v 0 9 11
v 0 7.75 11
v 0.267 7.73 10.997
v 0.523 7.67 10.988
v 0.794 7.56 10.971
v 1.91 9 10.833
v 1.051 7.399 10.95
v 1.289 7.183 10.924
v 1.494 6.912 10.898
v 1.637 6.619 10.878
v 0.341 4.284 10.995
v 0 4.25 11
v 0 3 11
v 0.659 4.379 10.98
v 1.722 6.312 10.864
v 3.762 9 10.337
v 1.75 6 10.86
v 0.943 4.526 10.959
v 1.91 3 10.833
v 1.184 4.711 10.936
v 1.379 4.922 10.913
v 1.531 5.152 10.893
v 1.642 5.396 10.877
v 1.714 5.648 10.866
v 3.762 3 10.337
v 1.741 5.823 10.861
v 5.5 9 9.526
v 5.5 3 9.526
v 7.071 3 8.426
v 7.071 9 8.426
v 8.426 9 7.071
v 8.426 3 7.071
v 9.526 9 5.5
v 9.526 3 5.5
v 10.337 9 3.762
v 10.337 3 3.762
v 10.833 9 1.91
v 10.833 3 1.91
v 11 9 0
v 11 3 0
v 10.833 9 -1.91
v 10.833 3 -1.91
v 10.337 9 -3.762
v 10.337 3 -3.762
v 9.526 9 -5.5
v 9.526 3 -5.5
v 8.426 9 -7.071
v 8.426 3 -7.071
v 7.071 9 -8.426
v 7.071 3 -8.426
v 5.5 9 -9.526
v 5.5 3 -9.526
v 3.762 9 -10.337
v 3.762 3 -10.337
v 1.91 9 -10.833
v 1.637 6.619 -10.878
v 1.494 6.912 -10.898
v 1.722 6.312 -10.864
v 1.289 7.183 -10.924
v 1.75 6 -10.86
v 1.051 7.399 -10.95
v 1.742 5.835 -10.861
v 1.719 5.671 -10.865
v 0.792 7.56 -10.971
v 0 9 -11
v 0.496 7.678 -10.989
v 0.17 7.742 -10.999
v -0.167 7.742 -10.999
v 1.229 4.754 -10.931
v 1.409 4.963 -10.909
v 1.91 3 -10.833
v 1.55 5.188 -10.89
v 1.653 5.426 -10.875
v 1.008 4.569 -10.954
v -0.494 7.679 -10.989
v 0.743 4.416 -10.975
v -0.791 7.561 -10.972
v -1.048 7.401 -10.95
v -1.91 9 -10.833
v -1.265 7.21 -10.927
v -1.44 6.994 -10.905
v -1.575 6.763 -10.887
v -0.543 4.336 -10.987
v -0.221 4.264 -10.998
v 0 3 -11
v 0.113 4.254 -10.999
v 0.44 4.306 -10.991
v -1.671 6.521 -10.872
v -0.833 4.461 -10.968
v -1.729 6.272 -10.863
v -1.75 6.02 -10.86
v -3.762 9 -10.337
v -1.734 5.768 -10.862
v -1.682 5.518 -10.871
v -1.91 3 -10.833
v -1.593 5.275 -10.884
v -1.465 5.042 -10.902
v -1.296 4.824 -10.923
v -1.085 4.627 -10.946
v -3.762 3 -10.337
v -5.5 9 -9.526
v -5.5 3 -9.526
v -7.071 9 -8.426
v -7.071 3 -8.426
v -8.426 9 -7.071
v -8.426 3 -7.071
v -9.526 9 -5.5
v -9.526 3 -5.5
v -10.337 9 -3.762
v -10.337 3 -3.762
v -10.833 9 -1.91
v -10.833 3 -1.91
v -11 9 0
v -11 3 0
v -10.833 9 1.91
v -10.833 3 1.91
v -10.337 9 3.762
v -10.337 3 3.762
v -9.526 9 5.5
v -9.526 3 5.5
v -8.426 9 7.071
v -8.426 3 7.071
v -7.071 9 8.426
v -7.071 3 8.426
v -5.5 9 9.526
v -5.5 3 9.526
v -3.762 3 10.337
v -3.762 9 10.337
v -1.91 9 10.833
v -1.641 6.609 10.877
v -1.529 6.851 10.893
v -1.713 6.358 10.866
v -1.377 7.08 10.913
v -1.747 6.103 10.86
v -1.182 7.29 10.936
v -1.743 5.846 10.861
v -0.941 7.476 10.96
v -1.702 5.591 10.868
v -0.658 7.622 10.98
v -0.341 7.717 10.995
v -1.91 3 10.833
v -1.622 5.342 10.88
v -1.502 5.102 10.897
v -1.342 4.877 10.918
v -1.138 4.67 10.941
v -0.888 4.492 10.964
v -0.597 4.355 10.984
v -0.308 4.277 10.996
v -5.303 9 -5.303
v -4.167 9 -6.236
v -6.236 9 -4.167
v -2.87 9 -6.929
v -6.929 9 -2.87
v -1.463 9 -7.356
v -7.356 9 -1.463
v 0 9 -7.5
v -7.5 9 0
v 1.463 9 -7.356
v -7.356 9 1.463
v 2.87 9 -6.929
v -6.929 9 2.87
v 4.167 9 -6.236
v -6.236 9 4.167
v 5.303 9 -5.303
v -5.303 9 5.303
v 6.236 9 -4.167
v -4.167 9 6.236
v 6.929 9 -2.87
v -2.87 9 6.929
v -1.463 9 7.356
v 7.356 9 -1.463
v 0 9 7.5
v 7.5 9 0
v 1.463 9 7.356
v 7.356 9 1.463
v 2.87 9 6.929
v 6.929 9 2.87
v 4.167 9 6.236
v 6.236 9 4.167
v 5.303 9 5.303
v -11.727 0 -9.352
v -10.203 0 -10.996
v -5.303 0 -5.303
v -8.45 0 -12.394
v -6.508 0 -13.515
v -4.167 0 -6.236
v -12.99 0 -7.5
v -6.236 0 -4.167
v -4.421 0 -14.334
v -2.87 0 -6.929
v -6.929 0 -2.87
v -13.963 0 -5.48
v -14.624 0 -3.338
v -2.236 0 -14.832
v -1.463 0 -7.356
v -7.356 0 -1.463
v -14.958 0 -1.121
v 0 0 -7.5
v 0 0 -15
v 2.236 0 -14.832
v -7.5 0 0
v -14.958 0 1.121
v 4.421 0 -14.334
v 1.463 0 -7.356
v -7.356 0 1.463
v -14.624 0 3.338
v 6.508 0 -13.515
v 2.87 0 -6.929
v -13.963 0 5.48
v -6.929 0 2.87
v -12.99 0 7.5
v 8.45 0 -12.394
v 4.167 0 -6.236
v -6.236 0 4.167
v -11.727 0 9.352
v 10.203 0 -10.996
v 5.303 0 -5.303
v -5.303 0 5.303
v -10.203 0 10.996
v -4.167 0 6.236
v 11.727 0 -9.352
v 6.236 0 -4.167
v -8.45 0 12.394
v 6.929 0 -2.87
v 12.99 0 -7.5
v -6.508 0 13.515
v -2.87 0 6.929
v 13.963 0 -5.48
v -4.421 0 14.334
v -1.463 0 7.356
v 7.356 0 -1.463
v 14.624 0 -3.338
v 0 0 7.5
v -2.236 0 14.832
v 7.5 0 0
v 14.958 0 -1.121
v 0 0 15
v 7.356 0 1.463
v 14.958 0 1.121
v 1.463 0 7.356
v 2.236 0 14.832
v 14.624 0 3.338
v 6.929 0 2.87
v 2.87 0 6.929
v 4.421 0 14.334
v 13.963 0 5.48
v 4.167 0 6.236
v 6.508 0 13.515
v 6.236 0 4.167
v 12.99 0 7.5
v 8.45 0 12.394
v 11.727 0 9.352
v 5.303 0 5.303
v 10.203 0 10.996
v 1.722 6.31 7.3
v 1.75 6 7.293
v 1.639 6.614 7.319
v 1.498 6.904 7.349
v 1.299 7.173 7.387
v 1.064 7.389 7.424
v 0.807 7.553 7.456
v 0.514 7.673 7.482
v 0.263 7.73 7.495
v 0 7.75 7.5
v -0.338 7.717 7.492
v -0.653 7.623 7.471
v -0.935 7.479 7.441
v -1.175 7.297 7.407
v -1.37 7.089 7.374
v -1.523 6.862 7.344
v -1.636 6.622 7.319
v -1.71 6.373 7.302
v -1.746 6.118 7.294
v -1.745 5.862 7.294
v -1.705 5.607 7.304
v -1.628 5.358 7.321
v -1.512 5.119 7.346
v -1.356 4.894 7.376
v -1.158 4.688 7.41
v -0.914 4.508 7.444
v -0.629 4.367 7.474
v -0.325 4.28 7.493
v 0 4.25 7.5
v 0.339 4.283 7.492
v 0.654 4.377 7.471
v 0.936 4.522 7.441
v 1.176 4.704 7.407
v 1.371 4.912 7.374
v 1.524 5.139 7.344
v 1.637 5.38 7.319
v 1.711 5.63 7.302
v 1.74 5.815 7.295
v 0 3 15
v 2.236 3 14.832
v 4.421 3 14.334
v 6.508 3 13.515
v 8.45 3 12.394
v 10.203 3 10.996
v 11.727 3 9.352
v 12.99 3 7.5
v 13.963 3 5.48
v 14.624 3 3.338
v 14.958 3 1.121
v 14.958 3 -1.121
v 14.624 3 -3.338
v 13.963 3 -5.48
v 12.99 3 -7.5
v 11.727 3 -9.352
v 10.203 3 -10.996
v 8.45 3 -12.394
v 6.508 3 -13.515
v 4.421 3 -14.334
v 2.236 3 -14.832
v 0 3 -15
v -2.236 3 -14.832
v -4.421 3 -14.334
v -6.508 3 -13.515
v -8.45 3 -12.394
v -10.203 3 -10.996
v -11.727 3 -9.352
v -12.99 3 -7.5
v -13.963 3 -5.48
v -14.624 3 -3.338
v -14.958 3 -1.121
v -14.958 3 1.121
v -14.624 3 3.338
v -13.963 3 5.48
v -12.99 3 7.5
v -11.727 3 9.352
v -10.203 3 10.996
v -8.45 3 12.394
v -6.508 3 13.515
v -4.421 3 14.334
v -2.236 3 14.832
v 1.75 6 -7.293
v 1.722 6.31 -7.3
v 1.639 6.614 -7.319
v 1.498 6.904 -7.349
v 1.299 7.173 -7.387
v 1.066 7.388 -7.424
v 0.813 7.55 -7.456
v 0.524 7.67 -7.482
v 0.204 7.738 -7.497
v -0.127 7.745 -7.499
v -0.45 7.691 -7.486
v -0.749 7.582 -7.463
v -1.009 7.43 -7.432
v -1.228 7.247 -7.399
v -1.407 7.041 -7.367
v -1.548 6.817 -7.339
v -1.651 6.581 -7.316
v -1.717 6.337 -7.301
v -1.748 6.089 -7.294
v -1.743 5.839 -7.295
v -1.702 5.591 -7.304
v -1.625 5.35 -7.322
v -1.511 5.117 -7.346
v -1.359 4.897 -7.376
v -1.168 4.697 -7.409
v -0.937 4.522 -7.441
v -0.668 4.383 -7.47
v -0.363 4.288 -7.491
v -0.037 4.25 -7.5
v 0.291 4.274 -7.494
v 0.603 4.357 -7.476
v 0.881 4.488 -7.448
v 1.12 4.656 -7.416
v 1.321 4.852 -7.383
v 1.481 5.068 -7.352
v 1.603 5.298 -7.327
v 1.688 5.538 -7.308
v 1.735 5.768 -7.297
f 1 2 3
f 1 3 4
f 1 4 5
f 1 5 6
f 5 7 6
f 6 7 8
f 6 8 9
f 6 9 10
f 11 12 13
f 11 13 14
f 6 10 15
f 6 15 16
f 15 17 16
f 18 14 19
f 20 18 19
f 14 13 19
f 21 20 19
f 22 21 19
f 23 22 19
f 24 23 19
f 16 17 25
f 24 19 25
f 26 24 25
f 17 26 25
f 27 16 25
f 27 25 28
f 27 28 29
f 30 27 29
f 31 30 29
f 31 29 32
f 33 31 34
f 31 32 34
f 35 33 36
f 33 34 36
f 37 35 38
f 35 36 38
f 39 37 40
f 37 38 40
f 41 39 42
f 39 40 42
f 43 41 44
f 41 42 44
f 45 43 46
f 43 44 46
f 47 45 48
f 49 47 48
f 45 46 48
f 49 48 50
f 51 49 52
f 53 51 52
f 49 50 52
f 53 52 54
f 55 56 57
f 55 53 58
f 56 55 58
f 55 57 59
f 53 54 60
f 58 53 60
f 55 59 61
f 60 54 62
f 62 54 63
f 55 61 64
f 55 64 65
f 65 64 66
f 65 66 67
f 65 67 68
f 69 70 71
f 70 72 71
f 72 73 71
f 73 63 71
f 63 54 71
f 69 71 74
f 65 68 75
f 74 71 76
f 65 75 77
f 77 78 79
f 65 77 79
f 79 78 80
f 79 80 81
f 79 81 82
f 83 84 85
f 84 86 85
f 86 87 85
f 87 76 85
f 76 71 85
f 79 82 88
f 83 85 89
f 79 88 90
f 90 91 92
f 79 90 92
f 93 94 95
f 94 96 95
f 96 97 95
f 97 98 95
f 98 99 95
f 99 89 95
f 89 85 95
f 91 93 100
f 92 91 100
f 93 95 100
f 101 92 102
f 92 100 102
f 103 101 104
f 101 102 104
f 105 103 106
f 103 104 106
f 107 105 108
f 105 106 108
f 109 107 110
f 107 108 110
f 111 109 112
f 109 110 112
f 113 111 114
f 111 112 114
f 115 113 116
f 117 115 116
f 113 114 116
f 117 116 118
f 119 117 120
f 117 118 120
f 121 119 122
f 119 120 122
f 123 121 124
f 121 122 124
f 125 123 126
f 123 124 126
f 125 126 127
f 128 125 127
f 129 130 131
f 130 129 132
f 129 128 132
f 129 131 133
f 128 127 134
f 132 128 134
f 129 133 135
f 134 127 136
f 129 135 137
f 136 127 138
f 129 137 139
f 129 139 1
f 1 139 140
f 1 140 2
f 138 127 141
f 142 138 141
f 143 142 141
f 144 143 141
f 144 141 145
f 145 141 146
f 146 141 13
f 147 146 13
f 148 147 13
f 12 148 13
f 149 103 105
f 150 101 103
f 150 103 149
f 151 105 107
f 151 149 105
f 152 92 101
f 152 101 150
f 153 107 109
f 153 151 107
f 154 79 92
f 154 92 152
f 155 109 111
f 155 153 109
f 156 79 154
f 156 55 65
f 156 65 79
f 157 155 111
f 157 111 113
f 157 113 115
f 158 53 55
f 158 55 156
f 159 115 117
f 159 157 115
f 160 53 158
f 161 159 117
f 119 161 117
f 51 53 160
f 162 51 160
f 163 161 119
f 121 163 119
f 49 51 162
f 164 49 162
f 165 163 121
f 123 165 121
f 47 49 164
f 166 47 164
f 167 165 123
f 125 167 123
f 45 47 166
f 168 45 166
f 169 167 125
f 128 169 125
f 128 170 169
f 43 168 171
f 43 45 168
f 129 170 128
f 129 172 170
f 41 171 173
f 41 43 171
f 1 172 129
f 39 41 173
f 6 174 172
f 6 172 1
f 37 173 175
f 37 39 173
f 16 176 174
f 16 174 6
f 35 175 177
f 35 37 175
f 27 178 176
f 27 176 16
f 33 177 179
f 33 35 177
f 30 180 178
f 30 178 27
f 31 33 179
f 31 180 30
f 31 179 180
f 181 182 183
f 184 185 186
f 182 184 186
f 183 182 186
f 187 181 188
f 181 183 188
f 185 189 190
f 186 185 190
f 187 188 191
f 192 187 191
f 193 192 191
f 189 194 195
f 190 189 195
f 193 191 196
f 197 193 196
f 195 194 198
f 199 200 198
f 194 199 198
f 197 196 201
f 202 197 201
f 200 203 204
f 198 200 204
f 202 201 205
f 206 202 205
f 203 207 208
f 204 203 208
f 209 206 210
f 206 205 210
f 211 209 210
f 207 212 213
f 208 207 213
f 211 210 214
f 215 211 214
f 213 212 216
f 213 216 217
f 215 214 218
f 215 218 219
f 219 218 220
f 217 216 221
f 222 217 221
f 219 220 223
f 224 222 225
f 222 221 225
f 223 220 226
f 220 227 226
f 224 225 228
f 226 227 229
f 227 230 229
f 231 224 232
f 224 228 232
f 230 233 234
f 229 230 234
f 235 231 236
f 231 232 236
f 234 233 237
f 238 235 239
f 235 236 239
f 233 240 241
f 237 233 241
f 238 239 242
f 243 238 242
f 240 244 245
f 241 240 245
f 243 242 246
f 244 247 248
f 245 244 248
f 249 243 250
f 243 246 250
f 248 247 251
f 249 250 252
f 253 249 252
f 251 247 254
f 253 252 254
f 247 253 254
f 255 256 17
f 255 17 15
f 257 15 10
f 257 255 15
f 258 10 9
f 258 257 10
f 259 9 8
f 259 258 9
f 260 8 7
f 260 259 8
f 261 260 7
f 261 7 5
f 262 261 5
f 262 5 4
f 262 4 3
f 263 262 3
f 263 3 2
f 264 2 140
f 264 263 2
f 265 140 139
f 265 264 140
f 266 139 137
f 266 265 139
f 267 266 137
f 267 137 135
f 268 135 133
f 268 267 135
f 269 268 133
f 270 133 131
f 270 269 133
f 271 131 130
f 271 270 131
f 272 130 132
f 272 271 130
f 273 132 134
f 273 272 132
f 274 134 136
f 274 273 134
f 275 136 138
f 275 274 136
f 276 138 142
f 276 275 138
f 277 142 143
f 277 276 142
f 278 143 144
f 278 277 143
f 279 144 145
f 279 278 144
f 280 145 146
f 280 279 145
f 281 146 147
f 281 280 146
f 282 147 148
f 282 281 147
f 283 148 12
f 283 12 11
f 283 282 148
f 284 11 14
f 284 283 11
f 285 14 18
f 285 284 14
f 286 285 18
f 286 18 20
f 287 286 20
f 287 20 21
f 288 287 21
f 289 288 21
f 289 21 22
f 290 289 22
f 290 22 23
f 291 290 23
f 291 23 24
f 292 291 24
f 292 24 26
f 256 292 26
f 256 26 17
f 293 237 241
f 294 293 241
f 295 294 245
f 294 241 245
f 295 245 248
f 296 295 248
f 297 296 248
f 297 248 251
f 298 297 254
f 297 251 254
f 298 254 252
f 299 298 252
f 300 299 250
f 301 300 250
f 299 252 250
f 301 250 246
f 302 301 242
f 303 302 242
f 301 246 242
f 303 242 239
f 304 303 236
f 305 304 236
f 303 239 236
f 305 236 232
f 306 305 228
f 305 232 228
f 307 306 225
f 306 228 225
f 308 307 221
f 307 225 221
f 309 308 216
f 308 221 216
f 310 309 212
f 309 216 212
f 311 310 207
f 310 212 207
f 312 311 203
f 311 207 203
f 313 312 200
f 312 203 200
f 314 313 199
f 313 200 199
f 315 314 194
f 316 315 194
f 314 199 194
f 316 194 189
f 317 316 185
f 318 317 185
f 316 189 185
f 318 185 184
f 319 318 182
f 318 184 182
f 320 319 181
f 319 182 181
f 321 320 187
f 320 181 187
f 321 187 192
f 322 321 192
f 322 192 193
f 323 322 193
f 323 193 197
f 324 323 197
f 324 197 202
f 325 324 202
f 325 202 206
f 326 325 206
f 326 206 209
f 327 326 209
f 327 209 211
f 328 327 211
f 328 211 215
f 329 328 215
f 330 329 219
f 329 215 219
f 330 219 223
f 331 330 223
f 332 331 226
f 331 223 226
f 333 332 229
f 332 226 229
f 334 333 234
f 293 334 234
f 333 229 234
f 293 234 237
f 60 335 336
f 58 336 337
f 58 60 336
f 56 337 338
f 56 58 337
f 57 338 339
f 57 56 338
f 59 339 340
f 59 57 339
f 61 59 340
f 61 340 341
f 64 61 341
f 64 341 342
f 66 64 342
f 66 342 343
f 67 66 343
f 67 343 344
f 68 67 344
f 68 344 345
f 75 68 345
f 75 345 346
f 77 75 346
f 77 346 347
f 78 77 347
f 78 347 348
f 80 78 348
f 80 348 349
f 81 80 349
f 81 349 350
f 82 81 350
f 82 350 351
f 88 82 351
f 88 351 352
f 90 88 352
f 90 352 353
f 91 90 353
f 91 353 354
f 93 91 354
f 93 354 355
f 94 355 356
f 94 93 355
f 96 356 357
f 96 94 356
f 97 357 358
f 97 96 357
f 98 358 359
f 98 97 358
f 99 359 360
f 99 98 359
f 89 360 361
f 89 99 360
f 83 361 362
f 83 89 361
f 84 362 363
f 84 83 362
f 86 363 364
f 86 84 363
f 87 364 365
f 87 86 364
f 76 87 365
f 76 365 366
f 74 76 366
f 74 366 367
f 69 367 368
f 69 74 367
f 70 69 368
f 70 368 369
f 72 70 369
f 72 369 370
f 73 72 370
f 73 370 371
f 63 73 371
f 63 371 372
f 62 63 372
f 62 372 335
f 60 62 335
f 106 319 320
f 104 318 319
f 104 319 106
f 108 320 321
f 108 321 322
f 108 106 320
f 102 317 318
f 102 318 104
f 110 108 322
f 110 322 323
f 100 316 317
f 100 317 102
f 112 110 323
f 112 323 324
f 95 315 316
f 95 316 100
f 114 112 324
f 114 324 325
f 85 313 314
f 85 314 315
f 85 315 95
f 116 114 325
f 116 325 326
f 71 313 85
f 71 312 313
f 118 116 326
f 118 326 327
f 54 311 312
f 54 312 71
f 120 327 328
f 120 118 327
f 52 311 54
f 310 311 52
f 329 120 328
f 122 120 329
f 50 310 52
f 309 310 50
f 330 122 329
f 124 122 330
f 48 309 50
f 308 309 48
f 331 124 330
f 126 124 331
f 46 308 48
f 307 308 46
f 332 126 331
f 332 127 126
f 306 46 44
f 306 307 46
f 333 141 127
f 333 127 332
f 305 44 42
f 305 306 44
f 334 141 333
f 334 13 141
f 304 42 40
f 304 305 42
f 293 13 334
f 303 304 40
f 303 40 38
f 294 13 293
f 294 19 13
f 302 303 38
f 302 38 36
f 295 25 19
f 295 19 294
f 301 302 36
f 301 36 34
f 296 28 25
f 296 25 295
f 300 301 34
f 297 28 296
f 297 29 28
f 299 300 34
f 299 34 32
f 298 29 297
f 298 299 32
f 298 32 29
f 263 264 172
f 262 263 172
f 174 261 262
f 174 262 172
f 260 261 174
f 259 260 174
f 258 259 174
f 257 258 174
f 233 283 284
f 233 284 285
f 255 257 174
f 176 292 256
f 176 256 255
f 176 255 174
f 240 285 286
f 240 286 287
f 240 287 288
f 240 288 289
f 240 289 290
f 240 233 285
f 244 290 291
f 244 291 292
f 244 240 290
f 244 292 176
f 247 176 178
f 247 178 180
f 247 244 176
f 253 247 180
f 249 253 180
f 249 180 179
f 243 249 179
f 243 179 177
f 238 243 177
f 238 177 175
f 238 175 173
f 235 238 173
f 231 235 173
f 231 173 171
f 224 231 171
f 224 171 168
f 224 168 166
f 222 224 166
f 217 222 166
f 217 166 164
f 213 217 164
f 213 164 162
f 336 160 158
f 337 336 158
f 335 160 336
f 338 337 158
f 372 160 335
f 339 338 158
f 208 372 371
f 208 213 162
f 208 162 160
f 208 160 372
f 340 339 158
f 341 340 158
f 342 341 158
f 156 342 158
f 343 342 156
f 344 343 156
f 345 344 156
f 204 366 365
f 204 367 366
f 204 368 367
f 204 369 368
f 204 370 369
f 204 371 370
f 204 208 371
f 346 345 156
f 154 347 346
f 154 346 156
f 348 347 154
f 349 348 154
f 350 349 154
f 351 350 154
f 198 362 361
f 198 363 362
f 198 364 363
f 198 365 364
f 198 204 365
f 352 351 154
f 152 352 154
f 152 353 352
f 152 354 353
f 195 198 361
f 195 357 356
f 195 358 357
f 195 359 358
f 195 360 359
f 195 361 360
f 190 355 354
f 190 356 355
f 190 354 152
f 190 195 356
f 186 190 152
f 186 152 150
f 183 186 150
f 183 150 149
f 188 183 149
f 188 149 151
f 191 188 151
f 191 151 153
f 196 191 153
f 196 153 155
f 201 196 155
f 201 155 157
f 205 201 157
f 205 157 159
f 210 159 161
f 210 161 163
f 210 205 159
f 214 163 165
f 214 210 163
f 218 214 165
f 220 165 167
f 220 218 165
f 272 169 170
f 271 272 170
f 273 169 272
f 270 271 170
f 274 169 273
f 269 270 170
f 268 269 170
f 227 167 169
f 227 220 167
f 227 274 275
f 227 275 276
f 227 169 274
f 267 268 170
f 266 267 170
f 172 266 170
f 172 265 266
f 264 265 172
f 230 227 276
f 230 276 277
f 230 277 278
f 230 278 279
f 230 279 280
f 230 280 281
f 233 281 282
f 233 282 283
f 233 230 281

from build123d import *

# Parameters (mm, degrees)
SKETCH1_R               = 15
SKETCH1_R_2             = 7.5
BOSS_EXTRUDE1_DEPTH     = 3
SKETCH2_R               = 11
SKETCH2_R_2             = 7.5
BOSS_EXTRUDE2_DEPTH     = 6
CUT_EXTRUDE1_DEPTH      = 24.043437244
CUT_EXTRUDE1_DEPTH_BACK = 24.043437244
SKETCH3_R               = 1.75


with BuildPart() as part:
    # Sketch1 → Boss-Extrude1 (new body)
    with BuildSketch(Plane(origin=(0, 0, 0), x_dir=(1, 0, 0), z_dir=(0, 1, 0))):
        with Locations(Location((0, 0, 0), (0, 0, 270))):
            Circle(SKETCH1_R)
        with Locations(Location((0, 0, 0), (0, 0, 270))):
            Circle(SKETCH1_R_2, mode=Mode.SUBTRACT)
    extrude(amount=BOSS_EXTRUDE1_DEPTH)

    # Sketch2 → Boss-Extrude2 (add)
    with BuildSketch(Plane(origin=(0, 3, 0), x_dir=(1, 0, 0), z_dir=(0, 1, 0))):
        with Locations(Location((0, 0, 0), (0, 0, 270))):
            Circle(SKETCH2_R)
        with Locations(Location((0, 0, 0), (0, 0, 270))):
            Circle(SKETCH2_R_2, mode=Mode.SUBTRACT)
    extrude(amount=BOSS_EXTRUDE2_DEPTH)

    # Sketch3 → Cut-Extrude1 (cut, two sides: drawn at the far end of the back side and taken through both)
    with BuildSketch(Plane.XY.offset(-CUT_EXTRUDE1_DEPTH_BACK)):
        with Locations((0, 6)):
            Circle(SKETCH3_R)
    extrude(amount=CUT_EXTRUDE1_DEPTH + CUT_EXTRUDE1_DEPTH_BACK, mode=Mode.SUBTRACT)


solid = part.part
